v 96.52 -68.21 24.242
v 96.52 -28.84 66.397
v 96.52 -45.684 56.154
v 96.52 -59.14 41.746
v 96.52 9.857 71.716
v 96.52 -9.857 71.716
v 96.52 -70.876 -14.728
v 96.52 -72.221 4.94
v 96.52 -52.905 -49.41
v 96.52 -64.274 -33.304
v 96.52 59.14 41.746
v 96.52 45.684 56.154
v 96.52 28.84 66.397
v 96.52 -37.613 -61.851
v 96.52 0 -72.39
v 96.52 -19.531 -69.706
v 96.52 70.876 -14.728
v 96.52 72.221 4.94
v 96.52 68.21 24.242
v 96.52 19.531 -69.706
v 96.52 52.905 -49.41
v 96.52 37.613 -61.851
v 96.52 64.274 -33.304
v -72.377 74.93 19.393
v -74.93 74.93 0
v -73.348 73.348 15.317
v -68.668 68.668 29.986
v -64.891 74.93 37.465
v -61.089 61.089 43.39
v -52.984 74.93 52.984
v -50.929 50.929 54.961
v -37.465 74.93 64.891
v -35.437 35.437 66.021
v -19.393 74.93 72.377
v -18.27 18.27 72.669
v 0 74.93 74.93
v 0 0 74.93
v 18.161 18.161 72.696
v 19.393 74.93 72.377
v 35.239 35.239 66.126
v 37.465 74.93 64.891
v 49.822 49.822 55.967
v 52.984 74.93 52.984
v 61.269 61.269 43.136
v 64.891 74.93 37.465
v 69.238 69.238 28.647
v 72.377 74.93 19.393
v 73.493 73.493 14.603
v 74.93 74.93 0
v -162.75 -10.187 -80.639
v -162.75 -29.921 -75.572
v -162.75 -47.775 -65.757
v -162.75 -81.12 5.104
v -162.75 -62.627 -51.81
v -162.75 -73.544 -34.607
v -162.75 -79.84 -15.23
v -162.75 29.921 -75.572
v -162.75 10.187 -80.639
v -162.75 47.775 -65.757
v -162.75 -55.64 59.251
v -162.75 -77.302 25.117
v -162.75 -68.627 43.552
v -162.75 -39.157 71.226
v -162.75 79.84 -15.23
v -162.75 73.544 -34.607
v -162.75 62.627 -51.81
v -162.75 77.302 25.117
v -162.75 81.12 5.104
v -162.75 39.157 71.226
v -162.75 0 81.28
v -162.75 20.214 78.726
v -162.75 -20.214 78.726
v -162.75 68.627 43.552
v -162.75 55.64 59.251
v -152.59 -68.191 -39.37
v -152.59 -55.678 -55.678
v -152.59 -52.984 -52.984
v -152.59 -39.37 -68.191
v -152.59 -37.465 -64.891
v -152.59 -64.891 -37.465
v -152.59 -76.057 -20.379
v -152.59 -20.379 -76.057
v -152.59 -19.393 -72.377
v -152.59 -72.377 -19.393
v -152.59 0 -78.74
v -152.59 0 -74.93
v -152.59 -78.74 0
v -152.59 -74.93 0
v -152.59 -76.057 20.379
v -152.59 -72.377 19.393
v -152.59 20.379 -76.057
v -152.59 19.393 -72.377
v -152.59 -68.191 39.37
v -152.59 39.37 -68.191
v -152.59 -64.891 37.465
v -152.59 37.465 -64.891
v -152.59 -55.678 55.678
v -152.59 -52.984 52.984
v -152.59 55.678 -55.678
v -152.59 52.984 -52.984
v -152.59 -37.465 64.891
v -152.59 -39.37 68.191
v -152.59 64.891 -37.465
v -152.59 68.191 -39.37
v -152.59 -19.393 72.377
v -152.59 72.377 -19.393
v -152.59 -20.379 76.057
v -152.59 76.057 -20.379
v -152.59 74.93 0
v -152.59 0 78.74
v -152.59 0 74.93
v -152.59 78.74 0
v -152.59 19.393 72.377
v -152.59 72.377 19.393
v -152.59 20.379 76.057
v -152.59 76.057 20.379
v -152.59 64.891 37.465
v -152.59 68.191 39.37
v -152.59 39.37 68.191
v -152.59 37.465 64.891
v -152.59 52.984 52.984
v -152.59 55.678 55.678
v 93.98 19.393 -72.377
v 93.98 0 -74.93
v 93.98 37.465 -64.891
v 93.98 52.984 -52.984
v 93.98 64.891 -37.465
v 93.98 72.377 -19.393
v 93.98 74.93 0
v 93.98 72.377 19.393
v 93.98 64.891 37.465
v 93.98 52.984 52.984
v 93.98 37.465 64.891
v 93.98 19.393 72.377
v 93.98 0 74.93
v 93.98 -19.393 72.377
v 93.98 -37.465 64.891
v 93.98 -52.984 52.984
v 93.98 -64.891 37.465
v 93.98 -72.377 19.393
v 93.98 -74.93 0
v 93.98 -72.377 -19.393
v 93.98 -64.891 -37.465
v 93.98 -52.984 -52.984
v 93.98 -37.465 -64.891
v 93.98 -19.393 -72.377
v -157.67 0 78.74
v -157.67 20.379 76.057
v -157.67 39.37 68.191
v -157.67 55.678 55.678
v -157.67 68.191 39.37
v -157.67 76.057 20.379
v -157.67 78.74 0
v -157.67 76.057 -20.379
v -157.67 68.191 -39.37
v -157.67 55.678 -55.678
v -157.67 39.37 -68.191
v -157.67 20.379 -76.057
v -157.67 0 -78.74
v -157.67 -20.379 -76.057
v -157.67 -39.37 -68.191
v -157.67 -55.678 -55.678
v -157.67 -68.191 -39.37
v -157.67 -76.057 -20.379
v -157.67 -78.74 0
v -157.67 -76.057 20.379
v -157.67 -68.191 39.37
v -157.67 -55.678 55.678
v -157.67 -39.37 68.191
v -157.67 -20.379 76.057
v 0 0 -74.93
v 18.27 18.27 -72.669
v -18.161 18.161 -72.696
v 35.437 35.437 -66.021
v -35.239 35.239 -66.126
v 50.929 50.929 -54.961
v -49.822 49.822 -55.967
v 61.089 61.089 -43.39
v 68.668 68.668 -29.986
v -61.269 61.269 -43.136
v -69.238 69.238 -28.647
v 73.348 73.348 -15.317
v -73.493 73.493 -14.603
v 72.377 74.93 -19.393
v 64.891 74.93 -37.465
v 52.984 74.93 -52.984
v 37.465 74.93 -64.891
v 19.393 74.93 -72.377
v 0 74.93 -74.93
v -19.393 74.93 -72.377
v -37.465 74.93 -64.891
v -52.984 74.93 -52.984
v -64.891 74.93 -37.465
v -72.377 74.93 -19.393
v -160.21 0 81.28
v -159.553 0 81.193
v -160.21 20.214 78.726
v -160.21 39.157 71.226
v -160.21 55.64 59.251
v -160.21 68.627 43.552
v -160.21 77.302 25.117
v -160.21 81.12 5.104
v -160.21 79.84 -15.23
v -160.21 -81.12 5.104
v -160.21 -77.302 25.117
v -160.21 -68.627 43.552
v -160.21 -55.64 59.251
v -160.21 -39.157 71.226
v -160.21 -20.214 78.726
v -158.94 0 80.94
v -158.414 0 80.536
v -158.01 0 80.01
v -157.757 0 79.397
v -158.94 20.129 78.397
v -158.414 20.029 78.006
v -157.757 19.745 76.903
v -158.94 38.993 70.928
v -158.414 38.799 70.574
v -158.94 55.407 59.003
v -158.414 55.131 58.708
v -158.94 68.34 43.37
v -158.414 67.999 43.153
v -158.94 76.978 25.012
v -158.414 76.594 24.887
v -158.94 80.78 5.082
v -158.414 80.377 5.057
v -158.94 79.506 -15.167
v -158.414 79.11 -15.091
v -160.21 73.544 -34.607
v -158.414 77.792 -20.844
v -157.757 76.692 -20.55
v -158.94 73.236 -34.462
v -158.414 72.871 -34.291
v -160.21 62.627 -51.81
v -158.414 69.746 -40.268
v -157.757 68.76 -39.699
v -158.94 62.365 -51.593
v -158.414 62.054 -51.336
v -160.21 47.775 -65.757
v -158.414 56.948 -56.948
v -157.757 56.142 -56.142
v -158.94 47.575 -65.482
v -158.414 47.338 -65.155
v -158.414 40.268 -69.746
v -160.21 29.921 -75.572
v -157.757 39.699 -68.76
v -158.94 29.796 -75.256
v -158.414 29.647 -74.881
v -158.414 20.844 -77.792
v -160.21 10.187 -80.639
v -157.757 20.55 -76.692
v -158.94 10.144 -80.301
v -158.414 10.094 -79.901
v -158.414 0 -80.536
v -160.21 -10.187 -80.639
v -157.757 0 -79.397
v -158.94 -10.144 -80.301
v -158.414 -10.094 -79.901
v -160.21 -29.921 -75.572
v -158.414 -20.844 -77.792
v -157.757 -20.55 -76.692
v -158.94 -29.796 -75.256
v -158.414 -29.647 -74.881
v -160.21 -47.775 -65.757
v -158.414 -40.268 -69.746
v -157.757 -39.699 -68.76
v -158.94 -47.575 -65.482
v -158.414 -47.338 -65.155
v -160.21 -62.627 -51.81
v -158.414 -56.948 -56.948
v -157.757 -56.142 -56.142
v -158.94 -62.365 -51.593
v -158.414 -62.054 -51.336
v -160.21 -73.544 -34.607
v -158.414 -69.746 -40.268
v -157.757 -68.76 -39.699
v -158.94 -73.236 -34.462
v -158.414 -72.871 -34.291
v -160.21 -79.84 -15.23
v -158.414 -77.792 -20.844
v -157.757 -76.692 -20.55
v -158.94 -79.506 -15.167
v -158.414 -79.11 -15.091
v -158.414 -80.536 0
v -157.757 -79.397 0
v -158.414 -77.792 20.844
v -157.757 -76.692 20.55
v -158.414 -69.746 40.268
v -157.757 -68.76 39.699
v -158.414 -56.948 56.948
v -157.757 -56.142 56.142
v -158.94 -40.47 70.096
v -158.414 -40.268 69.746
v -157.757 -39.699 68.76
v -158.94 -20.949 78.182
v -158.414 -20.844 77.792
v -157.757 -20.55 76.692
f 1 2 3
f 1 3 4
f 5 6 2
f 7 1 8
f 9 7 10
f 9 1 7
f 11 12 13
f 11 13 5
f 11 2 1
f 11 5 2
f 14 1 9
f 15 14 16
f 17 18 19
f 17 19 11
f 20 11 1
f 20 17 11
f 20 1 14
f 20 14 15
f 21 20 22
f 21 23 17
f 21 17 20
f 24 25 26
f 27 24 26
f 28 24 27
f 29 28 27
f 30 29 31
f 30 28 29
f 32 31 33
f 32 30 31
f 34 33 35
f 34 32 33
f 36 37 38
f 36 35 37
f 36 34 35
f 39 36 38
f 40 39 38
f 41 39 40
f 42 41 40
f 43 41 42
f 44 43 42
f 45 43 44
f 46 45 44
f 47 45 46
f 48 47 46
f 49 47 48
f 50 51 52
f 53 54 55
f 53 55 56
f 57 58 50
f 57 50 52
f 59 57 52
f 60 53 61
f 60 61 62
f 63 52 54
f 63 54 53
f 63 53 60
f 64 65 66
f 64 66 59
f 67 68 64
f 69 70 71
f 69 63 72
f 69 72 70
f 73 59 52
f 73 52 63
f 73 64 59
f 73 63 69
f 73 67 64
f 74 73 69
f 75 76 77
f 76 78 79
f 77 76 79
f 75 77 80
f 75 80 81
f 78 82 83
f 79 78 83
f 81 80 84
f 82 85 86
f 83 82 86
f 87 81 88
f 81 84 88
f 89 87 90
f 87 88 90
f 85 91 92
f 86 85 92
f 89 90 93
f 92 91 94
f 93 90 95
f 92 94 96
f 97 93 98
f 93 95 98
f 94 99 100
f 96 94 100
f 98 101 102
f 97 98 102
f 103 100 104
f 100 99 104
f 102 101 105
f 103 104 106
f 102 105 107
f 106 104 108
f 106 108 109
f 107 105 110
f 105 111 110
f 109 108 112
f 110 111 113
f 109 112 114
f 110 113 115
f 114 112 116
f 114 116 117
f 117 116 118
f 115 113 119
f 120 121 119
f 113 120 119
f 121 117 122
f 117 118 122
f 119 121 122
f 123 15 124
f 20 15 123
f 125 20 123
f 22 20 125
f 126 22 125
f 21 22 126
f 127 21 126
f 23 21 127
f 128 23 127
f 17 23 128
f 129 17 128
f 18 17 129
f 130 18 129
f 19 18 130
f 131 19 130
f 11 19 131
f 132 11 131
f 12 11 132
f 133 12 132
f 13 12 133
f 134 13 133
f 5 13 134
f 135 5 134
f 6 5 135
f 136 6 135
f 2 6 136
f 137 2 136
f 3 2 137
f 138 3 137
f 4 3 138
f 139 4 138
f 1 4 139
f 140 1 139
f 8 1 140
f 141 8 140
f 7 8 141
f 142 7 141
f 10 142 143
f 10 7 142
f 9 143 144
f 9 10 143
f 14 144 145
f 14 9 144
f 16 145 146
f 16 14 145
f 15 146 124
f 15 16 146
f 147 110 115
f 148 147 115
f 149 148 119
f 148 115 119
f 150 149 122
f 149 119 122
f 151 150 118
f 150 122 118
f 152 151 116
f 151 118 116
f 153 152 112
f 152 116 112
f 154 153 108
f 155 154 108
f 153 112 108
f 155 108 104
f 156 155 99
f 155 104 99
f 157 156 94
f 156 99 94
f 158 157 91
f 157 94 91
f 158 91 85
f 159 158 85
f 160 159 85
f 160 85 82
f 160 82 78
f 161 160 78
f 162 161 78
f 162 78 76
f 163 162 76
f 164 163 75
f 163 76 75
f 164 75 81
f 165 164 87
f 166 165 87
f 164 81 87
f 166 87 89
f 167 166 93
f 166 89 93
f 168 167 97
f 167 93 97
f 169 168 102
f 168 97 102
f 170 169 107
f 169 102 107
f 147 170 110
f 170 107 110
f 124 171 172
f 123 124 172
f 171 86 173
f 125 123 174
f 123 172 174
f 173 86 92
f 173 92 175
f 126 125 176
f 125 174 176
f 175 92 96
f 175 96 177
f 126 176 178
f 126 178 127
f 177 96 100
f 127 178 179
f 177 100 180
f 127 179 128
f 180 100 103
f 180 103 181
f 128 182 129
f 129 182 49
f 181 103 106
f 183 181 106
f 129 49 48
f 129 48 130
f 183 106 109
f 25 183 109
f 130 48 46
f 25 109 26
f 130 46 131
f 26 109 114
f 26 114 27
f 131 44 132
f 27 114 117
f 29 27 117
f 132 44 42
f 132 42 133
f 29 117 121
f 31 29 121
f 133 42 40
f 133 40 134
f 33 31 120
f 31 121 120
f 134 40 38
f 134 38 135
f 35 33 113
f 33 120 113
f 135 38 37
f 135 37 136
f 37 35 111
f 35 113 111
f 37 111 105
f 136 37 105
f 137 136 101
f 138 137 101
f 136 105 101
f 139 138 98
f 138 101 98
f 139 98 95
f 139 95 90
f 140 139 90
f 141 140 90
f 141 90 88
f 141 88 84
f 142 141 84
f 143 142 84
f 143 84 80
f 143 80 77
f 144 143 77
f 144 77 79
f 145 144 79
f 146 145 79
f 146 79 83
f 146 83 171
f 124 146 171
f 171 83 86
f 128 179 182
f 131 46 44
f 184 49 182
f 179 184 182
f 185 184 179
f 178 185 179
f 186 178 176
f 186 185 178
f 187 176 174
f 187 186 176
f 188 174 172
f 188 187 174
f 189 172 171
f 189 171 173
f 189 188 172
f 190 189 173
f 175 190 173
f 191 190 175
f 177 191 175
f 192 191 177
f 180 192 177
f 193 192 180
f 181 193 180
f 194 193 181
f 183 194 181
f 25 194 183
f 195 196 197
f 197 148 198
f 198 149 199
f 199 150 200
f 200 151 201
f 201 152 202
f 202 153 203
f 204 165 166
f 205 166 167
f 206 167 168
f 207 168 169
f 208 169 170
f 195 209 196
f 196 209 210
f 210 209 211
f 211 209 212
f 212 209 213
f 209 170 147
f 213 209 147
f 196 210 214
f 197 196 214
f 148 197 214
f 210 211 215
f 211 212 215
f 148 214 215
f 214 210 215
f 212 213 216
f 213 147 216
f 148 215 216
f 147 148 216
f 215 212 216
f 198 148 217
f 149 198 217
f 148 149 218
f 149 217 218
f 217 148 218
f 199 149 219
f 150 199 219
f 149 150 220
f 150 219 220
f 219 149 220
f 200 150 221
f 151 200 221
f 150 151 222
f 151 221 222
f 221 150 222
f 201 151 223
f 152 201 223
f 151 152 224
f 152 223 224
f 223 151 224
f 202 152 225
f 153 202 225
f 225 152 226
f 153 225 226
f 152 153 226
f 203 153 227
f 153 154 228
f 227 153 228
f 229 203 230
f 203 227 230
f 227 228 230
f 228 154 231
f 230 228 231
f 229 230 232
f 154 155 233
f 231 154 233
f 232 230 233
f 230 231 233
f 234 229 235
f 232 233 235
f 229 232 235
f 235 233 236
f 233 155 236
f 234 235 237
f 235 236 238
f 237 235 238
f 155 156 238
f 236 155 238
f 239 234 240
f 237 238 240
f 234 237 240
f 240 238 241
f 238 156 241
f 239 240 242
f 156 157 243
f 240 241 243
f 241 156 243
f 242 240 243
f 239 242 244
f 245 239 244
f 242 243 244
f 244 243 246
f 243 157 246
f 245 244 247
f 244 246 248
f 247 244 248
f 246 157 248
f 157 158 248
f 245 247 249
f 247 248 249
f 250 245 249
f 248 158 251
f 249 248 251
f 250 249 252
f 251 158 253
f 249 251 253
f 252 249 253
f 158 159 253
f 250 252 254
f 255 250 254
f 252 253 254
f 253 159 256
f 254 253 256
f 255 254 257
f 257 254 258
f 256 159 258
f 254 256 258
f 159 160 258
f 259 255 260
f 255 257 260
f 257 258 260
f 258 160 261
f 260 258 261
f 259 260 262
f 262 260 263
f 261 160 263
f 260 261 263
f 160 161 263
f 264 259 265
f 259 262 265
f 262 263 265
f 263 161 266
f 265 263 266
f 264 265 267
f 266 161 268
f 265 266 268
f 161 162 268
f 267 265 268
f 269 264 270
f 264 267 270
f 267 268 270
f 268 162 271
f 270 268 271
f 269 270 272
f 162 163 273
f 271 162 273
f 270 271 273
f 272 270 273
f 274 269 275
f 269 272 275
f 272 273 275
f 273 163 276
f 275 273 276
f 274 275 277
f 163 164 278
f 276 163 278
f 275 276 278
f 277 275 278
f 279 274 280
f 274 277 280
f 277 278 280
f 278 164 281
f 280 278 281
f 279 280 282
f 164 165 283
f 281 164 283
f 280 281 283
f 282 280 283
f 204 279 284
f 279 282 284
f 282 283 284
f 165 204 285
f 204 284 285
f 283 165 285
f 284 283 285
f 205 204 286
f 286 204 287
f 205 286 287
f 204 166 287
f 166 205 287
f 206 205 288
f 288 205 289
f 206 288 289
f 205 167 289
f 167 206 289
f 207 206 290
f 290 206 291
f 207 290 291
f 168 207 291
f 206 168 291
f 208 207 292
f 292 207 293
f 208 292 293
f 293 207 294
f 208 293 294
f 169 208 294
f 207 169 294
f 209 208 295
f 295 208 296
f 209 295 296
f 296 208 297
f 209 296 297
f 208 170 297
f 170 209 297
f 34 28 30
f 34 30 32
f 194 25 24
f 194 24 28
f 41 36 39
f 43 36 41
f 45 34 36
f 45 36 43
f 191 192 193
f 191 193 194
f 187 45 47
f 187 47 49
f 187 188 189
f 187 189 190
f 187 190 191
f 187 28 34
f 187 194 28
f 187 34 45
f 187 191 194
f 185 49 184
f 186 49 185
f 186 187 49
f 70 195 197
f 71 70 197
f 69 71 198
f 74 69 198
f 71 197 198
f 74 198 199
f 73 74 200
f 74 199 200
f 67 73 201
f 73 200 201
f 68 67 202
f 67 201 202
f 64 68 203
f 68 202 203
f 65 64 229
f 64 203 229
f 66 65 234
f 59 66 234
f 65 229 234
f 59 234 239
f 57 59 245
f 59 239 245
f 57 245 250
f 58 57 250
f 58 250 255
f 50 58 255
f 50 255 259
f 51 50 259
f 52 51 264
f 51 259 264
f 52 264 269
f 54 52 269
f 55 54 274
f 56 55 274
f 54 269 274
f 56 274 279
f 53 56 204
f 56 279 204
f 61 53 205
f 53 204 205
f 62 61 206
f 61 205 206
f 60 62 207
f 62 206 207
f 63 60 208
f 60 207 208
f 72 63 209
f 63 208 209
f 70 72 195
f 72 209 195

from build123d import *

# Parameters (mm, degrees)
SALIENTE_EXTRUIR3_DEPTH      = 96.52
SALIENTE_EXTRUIR3_DEPTH_BACK = 152.589992
CROQUIS3_R                   = 74.93
SALIENTE_EXTRUIR4_REACH      = 228.619
CROQUIS4_R                   = 74.93
CROQUIS5_R                   = 78.74
SALIENTE_EXTRUIR5_DEPTH      = 5.08
CROQUIS6_R                   = 81.28
SALIENTE_EXTRUIR6_DEPTH      = 5.08
REDONDEO1_R                  = 2.54
CHAFL_N1_SIZE                = 2.54


# Some blends are built 0.0001 mm under size
with BuildPart() as part:
    # Croquis3 → Saliente-Extruir3 (new, two sides: drawn at the far end of the back side and taken through both)
    with BuildSketch(Plane(origin=(0, 0, 0), x_dir=(0, 0, -1), z_dir=(1, 0, 0)).offset(-SALIENTE_EXTRUIR3_DEPTH_BACK)):
        Circle(CROQUIS3_R)
    extrude(amount=SALIENTE_EXTRUIR3_DEPTH + SALIENTE_EXTRUIR3_DEPTH_BACK)

    # Croquis4 → Saliente-Extruir4 (add, up to next)
    with BuildSketch(Plane(origin=(0, 74.93, 0), x_dir=(1, 0, 0), z_dir=(0, 1, 0)), mode=Mode.PRIVATE) as saliente_extruir4_sk1:
        Circle(CROQUIS4_R)
    saliente_extruir4_tool1 = extrude(saliente_extruir4_sk1.sketch, amount=-SALIENTE_EXTRUIR4_REACH, mode=Mode.PRIVATE) - part.part
    add(saliente_extruir4_tool1.solids().sort_by_distance((0, 74.93, 0))[0])
    add(saliente_extruir4_tool1.solids().sort_by_distance((0, 74.93, 0))[1])

    # Croquis5 → Saliente-Extruir5 (add)
    with BuildSketch(Plane.ZY.offset(152.589992)):
        Circle(CROQUIS5_R)
    extrude(amount=SALIENTE_EXTRUIR5_DEPTH)

    # Croquis6 → Saliente-Extruir6 (add)
    with BuildSketch(Plane.ZY.offset(157.669992)):
        Circle(CROQUIS6_R)
    extrude(amount=SALIENTE_EXTRUIR6_DEPTH)

    # Redondeo1
    redondeo1_edges = [part.edges().sort_by_distance(p)[0] for p in [
        (-157.669992, 0, -81.28),
    ]]
    fillet(redondeo1_edges, radius=REDONDEO1_R - 0.0001)  # a hair under: the kernel refuses the full size

    # Chaflán1
    # the kernel refuses this chamfer: 2.54 mm, written as the material it takes off along each edge
    with BuildSketch(Plane(origin=(96.52, 0, 0), x_dir=(0, 0, -1), z_dir=(0, -1, 0))) as chafl_n1_piece_1:
        Polygon((74.93, -CHAFL_N1_SIZE), (74.93 - CHAFL_N1_SIZE, 0), (74.93, 0), align=None)
    revolve(axis=Axis((96.52, 0, 0), (1, 0, 0)), mode=Mode.SUBTRACT)


solid = part.part
